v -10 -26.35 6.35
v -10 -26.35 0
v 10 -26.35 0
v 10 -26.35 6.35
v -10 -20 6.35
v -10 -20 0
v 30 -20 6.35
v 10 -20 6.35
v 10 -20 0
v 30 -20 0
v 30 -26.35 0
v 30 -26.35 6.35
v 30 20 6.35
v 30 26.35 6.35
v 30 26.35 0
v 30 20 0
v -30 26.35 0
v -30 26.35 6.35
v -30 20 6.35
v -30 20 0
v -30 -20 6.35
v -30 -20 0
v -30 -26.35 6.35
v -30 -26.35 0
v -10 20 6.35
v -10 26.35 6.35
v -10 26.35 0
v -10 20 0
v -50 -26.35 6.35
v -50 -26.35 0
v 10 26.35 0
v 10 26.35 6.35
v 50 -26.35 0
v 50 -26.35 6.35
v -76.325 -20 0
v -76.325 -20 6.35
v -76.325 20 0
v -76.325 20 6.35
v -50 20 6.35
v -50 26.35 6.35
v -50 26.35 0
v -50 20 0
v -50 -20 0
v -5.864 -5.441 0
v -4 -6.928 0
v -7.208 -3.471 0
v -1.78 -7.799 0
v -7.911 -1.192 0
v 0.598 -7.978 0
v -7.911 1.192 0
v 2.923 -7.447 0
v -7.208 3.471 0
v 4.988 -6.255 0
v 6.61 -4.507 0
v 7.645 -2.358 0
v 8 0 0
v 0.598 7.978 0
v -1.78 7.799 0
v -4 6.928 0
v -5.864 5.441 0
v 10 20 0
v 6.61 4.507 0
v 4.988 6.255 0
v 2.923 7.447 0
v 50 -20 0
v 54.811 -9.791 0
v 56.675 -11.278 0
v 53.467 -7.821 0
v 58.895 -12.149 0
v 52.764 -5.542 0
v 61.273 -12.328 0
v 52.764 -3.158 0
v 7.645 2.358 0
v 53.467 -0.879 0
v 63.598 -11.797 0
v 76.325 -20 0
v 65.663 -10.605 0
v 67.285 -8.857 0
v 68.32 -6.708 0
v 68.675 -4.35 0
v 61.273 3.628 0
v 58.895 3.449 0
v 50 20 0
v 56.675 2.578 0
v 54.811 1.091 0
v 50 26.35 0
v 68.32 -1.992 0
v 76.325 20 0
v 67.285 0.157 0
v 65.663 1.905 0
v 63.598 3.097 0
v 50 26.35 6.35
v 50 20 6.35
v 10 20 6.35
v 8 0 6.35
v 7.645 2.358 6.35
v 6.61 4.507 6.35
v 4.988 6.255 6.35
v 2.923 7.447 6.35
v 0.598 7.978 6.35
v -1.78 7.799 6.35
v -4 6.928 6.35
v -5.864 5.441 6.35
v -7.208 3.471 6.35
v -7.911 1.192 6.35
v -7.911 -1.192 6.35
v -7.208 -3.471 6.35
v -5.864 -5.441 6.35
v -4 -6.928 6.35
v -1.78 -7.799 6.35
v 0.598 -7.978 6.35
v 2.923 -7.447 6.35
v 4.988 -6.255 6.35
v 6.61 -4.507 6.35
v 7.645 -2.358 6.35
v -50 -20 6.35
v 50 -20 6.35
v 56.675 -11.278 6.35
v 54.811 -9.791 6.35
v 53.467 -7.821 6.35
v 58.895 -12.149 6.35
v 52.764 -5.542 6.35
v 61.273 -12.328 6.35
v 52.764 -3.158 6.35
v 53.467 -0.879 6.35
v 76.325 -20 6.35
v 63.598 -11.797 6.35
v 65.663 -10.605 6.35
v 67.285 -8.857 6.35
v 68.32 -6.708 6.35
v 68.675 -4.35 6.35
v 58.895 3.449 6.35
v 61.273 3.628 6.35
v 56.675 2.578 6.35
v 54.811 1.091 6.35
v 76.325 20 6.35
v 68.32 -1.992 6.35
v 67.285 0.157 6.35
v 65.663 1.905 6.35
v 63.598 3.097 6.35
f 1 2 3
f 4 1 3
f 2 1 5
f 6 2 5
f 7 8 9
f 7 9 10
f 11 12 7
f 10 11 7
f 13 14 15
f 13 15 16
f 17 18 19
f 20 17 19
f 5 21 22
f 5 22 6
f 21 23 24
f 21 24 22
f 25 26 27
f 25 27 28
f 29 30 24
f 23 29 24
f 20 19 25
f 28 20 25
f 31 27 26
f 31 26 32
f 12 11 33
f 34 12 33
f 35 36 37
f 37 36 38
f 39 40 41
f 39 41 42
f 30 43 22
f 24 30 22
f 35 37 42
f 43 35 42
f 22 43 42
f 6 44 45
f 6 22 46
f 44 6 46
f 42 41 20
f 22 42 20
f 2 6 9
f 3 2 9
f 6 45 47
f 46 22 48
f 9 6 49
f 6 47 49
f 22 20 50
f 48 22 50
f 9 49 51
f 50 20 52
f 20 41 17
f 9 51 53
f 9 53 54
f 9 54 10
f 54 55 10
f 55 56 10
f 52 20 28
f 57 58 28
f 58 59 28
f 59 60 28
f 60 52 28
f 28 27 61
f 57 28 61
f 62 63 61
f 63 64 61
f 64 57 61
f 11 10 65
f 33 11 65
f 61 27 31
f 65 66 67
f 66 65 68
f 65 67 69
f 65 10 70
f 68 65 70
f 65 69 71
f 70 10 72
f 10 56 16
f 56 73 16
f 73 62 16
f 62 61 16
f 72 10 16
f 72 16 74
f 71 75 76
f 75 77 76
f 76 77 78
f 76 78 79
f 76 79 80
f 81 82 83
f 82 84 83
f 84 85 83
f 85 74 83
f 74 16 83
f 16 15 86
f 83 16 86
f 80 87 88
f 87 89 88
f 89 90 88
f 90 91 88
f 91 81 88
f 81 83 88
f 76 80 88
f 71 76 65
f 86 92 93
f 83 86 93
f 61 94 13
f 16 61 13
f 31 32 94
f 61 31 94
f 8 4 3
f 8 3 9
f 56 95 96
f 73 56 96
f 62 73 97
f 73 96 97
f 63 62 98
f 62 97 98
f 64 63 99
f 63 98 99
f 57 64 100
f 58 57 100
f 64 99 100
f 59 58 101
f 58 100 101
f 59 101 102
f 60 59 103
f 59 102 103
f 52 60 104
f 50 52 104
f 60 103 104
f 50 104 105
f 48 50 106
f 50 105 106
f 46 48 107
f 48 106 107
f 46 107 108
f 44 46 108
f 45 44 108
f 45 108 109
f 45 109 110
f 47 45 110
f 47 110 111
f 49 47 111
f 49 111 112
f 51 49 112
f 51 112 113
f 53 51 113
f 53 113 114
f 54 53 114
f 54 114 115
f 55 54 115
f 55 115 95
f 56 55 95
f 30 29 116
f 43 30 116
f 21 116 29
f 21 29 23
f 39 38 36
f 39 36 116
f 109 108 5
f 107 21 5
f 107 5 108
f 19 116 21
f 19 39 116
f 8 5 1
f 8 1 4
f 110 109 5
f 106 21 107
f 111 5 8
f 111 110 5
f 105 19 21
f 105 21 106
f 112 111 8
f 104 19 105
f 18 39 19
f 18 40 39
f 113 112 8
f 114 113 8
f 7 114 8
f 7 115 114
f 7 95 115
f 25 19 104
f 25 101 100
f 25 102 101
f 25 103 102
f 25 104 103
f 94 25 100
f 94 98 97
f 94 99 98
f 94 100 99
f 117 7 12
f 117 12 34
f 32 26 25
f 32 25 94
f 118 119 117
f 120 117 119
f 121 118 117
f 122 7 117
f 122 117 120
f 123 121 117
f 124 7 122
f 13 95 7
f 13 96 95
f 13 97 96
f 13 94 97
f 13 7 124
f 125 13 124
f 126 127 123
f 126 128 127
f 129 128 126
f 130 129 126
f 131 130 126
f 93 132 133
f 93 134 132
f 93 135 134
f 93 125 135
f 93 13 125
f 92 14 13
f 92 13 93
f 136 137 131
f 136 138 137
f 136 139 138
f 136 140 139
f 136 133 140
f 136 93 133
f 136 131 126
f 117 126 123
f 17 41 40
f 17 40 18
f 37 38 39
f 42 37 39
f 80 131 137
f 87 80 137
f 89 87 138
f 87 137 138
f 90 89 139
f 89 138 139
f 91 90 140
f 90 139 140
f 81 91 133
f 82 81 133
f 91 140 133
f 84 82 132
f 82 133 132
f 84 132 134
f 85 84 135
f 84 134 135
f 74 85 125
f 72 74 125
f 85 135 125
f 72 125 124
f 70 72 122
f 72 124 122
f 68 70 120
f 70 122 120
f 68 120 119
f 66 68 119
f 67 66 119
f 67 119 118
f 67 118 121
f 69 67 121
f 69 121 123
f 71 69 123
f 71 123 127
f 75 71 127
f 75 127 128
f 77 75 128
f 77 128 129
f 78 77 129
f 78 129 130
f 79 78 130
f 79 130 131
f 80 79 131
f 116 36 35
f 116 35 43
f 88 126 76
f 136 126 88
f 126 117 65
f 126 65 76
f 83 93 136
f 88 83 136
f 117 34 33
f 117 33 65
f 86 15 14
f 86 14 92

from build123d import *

# Parameters (mm, degrees)
ESQUISSE1_W             = 165.35
ESQUISSE1_H             = 52.7
BOSS_EXTRU_1_DEPTH      = 6.35
ESQUISSE5_W             = 20
ESQUISSE5_H             = 6.35
ESQUISSE5_W_2           = 26.325
ENL_V_MAT_EXTRU_2_DEPTH = 88.004601171
ESQUISSE7_W             = 6.35
ESQUISSE7_H             = 52.7
ENL_V_MAT_EXTRU_4_DEPTH = 88.004601171
ESQUISSE6_R             = 8
ENL_V_MAT_EXTRU_3_DEPTH = 81.994756775


with BuildPart() as part:
    # Esquisse1 → Boss.-Extru.1 (new body)
    with BuildSketch(Plane.XY):
        Rectangle(ESQUISSE1_W, ESQUISSE1_H)
    extrude(amount=BOSS_EXTRU_1_DEPTH)

    # Esquisse5 → Enlèv. mat.-Extru.2 (cut, through all)
    with BuildSketch(Plane.XY.offset(6.35)):
        with Locations((-20, -23.175)):
            Rectangle(ESQUISSE5_W, ESQUISSE5_H)
        with Locations((20, -23.175)):
            Rectangle(ESQUISSE5_W, ESQUISSE5_H)
        with Locations((63.1625, -23.175)):
            Rectangle(ESQUISSE5_W_2, ESQUISSE5_H)
        with Locations((-63.1625, -23.175)):
            Rectangle(ESQUISSE5_W_2, ESQUISSE5_H)
    enl_v_mat_extru_2 = extrude(amount=-ENL_V_MAT_EXTRU_2_DEPTH, mode=Mode.SUBTRACT)

    # Symétrie2: Enlèv. mat.-Extru.2 across plane
    add(enl_v_mat_extru_2.mirror(Plane.ZX), mode=Mode.SUBTRACT)

    # Esquisse7 → Enlèv. mat.-Extru.4 (cut, through all)
    with BuildSketch(Plane.XY.offset(6.35)):
        with Locations((-79.5, 0)):
            Rectangle(ESQUISSE7_W, ESQUISSE7_H)
        with Locations((79.5, 0)):
            Rectangle(ESQUISSE7_W, ESQUISSE7_H)
    extrude(amount=-ENL_V_MAT_EXTRU_4_DEPTH, mode=Mode.SUBTRACT)

    # Esquisse6 → Enlèv. mat.-Extru.3 (cut, through all)
    with BuildSketch(Plane.XY.offset(6.35)):
        Circle(ESQUISSE6_R)
        with Locations((60.675, -4.35)):
            Circle(ESQUISSE6_R)
    extrude(amount=-ENL_V_MAT_EXTRU_3_DEPTH, mode=Mode.SUBTRACT)


solid = part.part
